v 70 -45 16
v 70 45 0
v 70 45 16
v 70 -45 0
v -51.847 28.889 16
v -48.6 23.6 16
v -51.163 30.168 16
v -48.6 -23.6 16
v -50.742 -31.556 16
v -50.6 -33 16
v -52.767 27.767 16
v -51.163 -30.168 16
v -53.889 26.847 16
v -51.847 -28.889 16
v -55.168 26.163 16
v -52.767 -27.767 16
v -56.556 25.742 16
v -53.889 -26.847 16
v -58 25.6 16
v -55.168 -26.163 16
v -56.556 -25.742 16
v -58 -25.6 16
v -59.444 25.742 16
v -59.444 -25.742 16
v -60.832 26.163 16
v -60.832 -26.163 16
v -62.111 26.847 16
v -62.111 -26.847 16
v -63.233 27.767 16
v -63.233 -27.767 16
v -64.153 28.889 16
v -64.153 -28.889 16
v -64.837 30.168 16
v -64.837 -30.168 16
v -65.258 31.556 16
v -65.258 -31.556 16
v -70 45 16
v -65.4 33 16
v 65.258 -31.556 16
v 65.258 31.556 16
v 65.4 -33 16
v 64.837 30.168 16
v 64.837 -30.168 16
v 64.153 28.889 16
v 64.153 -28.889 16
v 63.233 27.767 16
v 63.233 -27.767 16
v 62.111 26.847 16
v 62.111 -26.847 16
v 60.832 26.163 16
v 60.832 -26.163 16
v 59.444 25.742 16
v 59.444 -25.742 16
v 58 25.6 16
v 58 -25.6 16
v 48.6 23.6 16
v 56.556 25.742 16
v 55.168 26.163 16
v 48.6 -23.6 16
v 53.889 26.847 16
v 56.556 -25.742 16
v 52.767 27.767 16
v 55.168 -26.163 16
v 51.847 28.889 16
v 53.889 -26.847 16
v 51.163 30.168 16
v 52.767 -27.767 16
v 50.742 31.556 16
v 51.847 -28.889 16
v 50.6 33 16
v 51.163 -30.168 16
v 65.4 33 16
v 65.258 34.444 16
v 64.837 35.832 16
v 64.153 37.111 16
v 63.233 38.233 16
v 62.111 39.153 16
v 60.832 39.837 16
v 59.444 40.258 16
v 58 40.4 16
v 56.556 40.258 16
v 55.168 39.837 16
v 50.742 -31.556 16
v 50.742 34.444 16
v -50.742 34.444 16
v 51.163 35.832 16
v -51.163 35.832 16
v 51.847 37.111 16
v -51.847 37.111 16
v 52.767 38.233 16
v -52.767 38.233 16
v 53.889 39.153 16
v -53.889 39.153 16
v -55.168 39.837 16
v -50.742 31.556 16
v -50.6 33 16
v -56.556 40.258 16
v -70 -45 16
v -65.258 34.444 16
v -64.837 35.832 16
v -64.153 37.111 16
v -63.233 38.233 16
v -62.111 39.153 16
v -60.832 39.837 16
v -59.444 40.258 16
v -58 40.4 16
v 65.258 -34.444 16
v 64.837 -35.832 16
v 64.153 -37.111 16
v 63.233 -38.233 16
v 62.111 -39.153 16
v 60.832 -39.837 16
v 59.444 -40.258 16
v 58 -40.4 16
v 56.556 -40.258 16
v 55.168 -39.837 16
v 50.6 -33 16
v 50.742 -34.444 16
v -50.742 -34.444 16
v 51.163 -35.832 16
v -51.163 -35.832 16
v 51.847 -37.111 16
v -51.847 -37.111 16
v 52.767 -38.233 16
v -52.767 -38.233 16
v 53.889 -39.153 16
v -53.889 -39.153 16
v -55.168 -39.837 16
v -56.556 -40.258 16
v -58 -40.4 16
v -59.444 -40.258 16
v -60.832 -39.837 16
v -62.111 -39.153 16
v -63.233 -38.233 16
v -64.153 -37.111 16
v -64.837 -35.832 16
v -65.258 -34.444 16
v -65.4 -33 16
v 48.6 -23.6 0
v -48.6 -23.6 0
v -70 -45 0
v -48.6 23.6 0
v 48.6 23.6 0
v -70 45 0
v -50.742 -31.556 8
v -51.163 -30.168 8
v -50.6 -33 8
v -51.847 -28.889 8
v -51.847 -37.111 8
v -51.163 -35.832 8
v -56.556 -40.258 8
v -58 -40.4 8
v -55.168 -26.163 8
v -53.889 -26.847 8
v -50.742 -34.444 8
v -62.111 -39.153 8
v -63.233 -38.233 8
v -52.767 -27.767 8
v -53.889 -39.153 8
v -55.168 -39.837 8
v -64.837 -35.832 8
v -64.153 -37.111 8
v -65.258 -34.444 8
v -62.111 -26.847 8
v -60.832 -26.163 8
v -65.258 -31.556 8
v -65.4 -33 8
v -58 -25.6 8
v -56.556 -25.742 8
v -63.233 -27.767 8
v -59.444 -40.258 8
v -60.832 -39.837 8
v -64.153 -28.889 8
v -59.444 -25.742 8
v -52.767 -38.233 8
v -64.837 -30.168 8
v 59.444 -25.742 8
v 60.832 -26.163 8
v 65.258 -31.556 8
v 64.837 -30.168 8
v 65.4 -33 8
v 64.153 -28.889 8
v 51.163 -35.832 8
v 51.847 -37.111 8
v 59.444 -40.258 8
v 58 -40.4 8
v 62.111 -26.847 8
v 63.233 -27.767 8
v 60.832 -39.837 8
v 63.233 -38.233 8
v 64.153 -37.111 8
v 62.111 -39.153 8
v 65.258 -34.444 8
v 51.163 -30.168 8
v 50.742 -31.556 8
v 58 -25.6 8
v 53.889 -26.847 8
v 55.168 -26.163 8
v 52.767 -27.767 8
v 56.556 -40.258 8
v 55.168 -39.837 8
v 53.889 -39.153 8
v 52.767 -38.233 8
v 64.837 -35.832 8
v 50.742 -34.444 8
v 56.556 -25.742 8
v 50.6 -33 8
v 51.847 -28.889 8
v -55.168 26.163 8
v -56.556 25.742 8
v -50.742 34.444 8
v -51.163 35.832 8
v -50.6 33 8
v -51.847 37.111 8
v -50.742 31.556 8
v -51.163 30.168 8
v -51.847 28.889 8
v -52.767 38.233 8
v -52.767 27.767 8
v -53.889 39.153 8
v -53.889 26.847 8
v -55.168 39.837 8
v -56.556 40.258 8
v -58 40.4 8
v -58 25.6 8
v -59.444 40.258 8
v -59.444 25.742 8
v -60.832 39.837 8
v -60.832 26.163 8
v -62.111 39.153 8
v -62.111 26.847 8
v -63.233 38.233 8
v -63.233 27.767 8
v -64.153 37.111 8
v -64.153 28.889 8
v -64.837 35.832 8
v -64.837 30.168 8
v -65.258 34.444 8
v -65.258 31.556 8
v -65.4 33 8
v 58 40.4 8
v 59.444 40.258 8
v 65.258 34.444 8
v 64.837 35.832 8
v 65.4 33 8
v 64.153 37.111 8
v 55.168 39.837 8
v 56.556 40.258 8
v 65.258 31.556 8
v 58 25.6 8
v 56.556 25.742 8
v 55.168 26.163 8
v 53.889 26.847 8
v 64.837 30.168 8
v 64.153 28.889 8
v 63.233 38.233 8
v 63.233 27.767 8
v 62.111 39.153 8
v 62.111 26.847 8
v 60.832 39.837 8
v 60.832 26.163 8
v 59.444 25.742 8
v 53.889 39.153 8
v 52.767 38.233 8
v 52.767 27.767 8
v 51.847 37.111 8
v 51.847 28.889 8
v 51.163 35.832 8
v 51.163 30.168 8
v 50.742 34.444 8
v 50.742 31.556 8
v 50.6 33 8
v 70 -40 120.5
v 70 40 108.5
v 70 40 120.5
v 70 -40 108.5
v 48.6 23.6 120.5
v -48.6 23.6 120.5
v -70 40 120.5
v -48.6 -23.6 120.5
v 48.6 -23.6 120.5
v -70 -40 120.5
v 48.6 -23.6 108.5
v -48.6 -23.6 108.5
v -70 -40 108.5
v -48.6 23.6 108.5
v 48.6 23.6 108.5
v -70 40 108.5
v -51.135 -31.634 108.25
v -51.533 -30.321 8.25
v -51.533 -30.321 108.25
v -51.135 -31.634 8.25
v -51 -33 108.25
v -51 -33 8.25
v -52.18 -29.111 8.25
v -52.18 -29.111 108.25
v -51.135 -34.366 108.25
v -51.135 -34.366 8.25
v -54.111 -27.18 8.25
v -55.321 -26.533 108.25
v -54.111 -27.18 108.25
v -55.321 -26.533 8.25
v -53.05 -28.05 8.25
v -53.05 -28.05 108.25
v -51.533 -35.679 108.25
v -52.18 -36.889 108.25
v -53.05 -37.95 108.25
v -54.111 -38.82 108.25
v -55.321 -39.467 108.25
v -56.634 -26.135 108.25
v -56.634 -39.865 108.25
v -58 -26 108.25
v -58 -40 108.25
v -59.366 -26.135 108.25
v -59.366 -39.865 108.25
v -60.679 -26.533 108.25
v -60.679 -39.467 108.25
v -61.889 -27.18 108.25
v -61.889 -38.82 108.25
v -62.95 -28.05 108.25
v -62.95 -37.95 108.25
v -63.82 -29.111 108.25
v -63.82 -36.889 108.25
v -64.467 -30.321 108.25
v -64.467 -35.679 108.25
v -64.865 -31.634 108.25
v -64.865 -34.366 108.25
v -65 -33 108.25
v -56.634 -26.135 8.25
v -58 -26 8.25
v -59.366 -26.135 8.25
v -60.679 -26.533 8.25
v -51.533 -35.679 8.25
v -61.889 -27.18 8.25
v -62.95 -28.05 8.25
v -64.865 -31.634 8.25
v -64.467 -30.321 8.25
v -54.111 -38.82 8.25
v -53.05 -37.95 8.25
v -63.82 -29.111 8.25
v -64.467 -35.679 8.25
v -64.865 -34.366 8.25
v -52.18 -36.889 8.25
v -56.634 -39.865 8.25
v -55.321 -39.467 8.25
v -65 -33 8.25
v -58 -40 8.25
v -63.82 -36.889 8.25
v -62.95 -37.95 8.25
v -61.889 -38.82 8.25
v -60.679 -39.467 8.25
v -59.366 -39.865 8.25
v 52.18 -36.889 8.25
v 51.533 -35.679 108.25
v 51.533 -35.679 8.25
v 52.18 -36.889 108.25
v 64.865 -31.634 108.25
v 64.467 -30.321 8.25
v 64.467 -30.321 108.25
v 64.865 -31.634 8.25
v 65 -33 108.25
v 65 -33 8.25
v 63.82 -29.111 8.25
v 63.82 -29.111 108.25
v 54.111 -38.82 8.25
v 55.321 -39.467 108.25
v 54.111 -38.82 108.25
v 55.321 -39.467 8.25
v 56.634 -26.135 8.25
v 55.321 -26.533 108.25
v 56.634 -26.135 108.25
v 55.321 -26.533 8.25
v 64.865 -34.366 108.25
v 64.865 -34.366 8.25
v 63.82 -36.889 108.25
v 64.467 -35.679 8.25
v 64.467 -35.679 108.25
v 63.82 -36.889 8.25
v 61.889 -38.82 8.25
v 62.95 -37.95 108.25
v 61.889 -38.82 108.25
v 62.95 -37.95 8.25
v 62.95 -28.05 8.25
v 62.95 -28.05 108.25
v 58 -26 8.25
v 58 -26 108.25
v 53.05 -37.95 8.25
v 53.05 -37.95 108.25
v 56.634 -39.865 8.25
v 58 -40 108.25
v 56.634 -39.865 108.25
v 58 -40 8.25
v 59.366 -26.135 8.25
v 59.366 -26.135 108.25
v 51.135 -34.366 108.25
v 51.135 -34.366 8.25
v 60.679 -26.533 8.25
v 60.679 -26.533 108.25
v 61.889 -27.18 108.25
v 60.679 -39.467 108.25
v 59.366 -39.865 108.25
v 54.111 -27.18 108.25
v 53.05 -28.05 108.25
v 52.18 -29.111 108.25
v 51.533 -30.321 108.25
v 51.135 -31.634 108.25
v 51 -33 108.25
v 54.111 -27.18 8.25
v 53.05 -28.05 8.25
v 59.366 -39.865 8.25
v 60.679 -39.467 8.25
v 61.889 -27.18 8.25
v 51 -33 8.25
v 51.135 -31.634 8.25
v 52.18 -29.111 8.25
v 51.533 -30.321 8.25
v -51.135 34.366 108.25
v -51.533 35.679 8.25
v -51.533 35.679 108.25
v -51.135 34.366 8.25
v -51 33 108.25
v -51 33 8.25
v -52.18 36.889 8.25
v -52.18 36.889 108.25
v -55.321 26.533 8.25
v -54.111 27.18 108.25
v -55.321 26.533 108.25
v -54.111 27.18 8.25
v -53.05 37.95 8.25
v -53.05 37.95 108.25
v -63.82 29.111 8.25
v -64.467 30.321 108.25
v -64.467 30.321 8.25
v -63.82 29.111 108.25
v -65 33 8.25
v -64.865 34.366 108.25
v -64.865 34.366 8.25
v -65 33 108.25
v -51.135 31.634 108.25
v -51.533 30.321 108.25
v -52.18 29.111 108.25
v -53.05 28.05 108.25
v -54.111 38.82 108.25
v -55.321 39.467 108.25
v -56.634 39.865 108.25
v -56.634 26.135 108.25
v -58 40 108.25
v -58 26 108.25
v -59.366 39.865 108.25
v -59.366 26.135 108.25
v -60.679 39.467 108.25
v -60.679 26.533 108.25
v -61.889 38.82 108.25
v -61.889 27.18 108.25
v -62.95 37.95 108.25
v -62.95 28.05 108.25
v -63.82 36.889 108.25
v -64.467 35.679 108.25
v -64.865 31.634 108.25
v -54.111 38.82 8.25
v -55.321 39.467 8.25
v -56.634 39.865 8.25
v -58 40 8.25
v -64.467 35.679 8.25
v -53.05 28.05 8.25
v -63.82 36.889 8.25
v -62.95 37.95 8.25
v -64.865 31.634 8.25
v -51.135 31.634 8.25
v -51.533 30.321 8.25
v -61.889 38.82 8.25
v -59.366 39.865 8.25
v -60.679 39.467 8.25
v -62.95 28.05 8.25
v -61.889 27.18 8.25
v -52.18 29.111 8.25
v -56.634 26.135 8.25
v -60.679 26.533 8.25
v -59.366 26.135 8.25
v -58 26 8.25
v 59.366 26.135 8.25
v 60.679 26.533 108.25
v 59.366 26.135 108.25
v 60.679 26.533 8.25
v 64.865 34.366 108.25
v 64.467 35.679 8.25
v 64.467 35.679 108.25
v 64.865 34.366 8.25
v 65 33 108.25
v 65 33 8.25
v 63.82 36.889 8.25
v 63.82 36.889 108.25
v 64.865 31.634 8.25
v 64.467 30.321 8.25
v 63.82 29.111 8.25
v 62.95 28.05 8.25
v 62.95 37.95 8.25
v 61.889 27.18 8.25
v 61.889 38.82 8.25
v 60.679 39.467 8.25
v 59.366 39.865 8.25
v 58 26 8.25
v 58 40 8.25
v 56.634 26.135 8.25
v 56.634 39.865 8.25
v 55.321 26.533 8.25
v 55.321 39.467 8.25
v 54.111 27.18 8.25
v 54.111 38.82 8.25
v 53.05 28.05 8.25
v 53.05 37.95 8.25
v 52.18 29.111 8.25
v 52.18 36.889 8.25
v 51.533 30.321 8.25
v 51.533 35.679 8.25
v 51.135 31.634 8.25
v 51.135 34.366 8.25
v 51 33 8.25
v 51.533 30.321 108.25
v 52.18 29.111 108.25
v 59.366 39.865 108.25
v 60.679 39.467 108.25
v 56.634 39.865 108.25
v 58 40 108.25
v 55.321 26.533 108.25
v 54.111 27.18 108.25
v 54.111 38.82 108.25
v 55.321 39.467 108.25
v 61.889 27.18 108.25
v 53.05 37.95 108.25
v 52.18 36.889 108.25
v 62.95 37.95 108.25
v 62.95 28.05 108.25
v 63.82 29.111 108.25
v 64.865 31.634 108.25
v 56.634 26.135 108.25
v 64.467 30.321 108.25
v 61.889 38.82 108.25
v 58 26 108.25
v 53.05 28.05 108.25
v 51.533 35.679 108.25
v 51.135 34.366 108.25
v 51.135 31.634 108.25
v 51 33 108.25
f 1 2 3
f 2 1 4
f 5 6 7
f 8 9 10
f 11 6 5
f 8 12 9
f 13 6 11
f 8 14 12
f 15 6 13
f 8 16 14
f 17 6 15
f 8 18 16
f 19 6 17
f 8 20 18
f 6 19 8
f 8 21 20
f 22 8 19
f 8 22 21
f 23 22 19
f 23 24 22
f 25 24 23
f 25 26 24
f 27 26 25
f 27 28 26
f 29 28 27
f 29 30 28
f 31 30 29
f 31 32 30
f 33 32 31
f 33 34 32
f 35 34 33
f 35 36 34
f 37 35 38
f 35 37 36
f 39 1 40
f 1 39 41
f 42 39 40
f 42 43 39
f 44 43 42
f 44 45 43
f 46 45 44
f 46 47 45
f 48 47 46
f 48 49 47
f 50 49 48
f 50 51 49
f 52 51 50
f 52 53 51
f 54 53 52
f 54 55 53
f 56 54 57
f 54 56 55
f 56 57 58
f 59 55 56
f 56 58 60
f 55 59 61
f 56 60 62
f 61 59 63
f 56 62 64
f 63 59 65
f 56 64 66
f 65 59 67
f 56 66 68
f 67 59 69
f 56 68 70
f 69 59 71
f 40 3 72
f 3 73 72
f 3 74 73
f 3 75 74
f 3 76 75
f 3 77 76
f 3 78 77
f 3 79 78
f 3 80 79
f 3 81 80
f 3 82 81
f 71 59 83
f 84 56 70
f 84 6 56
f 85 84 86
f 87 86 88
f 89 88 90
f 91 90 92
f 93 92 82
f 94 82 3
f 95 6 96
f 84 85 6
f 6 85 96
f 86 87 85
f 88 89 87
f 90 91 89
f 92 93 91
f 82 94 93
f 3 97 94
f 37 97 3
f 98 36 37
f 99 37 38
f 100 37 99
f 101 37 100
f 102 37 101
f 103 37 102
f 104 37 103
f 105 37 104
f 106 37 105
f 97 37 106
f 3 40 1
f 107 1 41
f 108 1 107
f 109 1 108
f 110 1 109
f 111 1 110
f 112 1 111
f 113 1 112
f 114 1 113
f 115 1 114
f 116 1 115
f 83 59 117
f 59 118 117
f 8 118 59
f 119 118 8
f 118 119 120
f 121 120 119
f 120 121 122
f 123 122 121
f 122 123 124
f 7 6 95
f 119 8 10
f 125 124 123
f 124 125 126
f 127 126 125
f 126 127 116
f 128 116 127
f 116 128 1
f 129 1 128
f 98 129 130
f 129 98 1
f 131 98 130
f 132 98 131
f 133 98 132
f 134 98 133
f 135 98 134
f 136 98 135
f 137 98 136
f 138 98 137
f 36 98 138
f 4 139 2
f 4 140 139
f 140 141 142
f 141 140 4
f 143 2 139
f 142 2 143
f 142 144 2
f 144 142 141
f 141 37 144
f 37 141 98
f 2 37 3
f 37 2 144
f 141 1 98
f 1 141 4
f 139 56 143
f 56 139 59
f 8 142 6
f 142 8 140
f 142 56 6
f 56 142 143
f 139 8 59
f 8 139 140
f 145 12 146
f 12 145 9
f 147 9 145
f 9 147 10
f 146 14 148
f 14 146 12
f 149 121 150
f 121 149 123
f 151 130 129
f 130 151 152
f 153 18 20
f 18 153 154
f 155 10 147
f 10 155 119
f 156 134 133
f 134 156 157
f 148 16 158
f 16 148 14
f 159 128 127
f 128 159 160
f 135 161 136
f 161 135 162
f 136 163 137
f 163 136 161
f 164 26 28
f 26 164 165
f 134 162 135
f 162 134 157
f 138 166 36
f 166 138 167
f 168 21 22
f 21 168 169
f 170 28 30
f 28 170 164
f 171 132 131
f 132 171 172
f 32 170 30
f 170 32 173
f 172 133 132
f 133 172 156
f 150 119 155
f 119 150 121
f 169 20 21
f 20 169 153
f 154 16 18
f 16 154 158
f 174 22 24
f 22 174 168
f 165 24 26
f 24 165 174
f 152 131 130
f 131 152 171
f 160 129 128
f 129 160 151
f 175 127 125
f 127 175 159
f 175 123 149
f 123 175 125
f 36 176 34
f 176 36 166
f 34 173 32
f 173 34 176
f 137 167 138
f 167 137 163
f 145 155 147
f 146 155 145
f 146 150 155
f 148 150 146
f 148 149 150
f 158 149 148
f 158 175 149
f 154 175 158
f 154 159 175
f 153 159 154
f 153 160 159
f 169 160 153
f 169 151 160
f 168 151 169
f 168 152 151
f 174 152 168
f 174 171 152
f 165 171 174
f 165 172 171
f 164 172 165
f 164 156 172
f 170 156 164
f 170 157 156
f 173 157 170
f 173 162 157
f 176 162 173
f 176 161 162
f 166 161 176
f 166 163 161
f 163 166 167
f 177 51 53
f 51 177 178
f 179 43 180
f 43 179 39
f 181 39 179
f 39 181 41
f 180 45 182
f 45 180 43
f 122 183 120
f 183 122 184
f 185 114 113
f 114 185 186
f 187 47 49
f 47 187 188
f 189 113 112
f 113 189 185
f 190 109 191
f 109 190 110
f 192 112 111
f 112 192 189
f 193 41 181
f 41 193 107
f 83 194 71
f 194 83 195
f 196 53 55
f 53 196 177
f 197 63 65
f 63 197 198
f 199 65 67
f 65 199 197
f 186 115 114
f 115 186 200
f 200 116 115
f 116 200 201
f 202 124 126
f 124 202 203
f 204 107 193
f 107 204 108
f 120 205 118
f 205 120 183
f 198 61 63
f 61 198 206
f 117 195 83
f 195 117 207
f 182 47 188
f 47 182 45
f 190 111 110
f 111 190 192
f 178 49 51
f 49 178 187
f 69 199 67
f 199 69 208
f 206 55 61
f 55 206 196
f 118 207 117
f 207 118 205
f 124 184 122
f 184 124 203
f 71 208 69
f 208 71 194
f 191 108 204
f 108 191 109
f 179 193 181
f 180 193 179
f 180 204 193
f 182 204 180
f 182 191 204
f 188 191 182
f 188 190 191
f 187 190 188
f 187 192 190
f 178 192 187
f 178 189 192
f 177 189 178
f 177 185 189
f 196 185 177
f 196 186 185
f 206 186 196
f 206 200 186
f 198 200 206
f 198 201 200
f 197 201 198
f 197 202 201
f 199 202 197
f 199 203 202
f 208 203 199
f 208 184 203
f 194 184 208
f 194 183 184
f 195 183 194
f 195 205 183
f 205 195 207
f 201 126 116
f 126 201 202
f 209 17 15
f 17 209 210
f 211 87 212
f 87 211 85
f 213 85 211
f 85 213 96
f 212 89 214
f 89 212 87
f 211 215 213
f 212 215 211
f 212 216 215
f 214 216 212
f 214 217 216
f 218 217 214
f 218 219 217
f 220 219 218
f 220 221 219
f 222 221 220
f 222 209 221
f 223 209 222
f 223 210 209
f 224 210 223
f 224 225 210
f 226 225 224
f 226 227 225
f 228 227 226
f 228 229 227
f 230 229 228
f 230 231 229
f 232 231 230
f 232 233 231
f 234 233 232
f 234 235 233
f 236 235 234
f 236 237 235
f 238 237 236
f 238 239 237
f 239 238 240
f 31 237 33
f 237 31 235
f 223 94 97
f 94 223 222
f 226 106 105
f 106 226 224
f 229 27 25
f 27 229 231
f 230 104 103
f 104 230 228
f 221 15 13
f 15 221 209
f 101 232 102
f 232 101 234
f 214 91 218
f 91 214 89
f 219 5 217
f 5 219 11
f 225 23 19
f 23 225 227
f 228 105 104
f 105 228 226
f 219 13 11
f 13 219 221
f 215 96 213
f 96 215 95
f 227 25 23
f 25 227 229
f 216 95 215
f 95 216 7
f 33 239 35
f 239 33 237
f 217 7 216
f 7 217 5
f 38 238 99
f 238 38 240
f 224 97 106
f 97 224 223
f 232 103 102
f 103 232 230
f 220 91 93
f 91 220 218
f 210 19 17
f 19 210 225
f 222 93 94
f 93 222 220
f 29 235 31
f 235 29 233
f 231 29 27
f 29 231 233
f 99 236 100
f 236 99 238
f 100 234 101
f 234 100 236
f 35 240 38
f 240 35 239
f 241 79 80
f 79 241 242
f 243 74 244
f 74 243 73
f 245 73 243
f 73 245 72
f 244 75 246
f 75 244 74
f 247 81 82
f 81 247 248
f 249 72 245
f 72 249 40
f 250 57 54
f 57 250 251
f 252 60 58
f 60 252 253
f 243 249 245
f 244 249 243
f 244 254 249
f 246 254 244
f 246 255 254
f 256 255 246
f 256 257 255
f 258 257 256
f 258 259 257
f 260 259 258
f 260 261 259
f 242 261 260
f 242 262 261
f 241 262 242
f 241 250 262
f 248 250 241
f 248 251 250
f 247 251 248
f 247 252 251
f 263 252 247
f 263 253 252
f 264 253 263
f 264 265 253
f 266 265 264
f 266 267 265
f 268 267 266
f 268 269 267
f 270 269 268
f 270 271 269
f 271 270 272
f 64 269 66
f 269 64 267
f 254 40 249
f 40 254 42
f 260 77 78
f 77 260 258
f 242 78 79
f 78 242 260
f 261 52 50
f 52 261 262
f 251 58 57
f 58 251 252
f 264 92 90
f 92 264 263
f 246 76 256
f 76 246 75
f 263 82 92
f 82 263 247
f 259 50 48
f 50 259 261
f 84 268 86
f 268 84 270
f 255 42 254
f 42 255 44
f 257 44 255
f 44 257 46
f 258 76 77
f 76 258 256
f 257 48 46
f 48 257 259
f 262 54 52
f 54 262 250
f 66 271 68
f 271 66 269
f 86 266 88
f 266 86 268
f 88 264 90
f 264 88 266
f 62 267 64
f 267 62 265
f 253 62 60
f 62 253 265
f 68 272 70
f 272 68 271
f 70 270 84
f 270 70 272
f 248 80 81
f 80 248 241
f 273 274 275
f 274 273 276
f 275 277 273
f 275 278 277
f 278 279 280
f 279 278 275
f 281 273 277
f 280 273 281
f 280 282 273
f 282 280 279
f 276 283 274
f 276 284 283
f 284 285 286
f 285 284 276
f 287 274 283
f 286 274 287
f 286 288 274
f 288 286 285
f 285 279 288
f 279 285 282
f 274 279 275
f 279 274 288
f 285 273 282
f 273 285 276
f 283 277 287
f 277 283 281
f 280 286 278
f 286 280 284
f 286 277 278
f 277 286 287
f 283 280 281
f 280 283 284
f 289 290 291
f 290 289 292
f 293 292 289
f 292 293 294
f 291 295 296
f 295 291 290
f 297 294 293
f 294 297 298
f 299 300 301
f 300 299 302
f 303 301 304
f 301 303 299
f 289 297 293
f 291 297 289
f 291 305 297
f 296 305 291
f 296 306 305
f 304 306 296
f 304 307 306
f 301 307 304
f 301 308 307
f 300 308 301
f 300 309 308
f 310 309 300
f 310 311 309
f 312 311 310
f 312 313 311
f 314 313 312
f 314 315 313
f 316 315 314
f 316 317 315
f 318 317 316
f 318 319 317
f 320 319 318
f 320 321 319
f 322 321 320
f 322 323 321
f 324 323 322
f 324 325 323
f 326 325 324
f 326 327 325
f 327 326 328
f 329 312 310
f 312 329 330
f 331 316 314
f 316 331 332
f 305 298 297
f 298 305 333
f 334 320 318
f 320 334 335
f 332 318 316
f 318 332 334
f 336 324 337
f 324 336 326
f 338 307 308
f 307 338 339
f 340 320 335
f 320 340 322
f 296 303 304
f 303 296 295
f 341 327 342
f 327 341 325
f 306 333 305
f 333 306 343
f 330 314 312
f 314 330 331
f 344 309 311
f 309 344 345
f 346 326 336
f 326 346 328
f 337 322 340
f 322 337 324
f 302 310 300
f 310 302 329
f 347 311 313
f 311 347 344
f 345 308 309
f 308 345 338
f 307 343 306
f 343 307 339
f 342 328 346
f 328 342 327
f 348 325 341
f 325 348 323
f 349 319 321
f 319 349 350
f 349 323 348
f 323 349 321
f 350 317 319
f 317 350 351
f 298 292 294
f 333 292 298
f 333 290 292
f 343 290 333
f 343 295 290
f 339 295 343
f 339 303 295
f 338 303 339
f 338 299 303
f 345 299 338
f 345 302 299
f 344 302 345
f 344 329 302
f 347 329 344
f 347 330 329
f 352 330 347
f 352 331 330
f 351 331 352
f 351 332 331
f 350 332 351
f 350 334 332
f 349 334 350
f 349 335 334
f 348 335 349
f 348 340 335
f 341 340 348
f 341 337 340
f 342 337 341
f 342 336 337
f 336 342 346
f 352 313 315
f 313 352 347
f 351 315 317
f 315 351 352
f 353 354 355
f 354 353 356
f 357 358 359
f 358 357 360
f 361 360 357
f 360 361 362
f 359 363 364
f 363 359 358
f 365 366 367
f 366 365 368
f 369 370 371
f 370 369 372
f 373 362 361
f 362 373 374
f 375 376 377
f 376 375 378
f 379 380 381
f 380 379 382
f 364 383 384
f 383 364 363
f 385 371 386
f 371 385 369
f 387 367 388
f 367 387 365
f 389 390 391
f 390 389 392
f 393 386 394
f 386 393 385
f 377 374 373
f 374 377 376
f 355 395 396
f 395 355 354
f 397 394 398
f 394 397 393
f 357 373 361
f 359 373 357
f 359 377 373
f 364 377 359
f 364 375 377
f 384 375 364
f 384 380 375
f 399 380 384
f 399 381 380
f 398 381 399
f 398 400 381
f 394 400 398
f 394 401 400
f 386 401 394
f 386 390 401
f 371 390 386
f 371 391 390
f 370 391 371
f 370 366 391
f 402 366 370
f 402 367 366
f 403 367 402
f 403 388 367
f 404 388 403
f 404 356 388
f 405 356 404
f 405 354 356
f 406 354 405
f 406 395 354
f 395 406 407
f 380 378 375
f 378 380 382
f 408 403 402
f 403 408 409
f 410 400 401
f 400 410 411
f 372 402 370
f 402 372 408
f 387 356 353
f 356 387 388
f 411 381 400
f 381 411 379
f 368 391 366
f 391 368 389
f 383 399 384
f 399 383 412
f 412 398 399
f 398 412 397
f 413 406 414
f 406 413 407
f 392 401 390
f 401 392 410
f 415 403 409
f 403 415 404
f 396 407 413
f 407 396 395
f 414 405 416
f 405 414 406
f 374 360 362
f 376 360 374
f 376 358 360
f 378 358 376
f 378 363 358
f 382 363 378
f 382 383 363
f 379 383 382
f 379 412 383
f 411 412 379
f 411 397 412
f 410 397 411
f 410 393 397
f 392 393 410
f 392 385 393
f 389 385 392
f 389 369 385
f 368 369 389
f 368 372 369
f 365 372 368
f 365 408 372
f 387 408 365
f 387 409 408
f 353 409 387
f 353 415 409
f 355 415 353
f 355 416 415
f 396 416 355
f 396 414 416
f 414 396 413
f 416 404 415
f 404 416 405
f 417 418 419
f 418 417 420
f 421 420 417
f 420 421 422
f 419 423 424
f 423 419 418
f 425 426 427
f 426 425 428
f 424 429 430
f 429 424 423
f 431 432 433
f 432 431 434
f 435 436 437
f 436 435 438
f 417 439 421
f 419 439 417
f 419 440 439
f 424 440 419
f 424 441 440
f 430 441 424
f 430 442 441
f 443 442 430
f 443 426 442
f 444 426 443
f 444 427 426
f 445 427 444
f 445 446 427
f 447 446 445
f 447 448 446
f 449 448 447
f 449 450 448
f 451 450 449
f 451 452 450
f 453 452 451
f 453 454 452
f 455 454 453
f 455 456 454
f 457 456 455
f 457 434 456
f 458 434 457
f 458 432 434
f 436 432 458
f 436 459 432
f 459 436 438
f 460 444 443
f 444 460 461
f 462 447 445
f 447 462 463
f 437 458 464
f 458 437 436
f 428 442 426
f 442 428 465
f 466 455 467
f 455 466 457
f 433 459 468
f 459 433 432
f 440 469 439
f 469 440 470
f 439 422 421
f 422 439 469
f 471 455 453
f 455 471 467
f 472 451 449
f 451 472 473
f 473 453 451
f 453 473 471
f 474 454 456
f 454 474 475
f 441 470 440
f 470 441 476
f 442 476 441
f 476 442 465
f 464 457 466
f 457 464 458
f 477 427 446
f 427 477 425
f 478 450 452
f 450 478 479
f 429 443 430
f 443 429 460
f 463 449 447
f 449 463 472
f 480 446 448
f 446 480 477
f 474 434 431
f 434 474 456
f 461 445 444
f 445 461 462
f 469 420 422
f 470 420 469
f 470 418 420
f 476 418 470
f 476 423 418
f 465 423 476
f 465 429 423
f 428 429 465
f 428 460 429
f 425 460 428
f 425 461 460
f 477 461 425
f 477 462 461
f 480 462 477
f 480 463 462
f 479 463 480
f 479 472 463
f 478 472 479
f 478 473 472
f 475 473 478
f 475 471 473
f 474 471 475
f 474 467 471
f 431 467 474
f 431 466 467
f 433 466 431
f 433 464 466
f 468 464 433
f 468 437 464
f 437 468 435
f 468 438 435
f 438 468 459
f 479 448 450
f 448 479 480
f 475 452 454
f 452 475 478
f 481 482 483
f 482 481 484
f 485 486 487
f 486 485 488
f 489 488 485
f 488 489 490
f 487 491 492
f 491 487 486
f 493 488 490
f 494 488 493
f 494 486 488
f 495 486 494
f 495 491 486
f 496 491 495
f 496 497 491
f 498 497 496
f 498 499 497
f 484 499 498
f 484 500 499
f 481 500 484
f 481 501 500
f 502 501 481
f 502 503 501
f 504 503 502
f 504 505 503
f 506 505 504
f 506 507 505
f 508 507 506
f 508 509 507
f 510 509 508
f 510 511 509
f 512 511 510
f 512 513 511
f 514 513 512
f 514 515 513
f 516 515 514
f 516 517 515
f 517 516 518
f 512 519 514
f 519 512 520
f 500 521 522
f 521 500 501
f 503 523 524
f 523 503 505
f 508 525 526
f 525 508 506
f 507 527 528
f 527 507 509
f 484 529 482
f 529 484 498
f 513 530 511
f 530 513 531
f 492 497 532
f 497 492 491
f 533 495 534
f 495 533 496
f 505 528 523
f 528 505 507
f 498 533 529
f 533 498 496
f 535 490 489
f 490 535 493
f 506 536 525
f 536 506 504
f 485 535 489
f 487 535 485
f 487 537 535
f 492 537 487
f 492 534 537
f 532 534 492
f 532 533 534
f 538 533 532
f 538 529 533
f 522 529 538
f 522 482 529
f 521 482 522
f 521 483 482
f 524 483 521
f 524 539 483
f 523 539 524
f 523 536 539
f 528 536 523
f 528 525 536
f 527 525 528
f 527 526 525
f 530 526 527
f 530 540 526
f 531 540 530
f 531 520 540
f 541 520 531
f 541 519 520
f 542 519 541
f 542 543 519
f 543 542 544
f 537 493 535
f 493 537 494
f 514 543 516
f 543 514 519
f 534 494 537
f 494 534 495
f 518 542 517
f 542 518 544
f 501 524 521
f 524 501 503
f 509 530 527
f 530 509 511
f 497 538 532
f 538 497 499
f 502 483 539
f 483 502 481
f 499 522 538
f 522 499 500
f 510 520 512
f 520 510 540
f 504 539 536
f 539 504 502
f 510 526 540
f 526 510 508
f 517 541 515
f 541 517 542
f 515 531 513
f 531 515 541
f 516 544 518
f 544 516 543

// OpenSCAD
$fn = 32;

// ------------------------------------------------------------------------
// Frame cube: base 140 x 90 mm, posts 100 mm tall
// Every part is its own module, assembly() places every instance.
// ------------------------------------------------------------------------

// --- part 1 ---
module base_frame() {
  difference() {
    translate([-70, -45, 0]) cube([140, 90, 16]);
    translate([-48.6, -23.6, -1]) cube([97.2, 47.2, 18]);
    translate([-58, -33, 8]) cylinder(h = 9, d = 14.8);
    translate([58, -33, 8]) cylinder(h = 9, d = 14.8);
    translate([-58, 33, 8]) cylinder(h = 9, d = 14.8);
    translate([58, 33, 8]) cylinder(h = 9, d = 14.8);
  }
}

// --- part 2 ---
module corner_post() {
  cylinder(h = 100, d = 14);
}

// --- part 3 ---
module top_frame() {
  difference() {
    translate([-70, -40, 0]) cube([140, 80, 12]);
    translate([-48.6, -23.6, -1]) cube([97.2, 47.2, 14]);
  }
}

// --- assembly ---
module assembly() {
  color([0.80, 0.24, 0.20]) translate([0, 0, 0]) rotate([0, 0, 0]) base_frame();
  color([0.20, 0.45, 0.75]) translate([-58, -33, 8.25]) rotate([0, 0, 0]) corner_post();
  color([0.25, 0.62, 0.32]) translate([58, -33, 8.25]) rotate([0, 0, 0]) corner_post();
  color([0.92, 0.70, 0.18]) translate([-58, 33, 8.25]) rotate([0, 0, 0]) corner_post();
  color([0.58, 0.35, 0.70]) translate([58, 33, 8.25]) rotate([0, 0, 0]) corner_post();
  color([0.16, 0.66, 0.66]) translate([0, 0, 108.5]) rotate([0, 0, 0]) top_frame();
}

assembly();
